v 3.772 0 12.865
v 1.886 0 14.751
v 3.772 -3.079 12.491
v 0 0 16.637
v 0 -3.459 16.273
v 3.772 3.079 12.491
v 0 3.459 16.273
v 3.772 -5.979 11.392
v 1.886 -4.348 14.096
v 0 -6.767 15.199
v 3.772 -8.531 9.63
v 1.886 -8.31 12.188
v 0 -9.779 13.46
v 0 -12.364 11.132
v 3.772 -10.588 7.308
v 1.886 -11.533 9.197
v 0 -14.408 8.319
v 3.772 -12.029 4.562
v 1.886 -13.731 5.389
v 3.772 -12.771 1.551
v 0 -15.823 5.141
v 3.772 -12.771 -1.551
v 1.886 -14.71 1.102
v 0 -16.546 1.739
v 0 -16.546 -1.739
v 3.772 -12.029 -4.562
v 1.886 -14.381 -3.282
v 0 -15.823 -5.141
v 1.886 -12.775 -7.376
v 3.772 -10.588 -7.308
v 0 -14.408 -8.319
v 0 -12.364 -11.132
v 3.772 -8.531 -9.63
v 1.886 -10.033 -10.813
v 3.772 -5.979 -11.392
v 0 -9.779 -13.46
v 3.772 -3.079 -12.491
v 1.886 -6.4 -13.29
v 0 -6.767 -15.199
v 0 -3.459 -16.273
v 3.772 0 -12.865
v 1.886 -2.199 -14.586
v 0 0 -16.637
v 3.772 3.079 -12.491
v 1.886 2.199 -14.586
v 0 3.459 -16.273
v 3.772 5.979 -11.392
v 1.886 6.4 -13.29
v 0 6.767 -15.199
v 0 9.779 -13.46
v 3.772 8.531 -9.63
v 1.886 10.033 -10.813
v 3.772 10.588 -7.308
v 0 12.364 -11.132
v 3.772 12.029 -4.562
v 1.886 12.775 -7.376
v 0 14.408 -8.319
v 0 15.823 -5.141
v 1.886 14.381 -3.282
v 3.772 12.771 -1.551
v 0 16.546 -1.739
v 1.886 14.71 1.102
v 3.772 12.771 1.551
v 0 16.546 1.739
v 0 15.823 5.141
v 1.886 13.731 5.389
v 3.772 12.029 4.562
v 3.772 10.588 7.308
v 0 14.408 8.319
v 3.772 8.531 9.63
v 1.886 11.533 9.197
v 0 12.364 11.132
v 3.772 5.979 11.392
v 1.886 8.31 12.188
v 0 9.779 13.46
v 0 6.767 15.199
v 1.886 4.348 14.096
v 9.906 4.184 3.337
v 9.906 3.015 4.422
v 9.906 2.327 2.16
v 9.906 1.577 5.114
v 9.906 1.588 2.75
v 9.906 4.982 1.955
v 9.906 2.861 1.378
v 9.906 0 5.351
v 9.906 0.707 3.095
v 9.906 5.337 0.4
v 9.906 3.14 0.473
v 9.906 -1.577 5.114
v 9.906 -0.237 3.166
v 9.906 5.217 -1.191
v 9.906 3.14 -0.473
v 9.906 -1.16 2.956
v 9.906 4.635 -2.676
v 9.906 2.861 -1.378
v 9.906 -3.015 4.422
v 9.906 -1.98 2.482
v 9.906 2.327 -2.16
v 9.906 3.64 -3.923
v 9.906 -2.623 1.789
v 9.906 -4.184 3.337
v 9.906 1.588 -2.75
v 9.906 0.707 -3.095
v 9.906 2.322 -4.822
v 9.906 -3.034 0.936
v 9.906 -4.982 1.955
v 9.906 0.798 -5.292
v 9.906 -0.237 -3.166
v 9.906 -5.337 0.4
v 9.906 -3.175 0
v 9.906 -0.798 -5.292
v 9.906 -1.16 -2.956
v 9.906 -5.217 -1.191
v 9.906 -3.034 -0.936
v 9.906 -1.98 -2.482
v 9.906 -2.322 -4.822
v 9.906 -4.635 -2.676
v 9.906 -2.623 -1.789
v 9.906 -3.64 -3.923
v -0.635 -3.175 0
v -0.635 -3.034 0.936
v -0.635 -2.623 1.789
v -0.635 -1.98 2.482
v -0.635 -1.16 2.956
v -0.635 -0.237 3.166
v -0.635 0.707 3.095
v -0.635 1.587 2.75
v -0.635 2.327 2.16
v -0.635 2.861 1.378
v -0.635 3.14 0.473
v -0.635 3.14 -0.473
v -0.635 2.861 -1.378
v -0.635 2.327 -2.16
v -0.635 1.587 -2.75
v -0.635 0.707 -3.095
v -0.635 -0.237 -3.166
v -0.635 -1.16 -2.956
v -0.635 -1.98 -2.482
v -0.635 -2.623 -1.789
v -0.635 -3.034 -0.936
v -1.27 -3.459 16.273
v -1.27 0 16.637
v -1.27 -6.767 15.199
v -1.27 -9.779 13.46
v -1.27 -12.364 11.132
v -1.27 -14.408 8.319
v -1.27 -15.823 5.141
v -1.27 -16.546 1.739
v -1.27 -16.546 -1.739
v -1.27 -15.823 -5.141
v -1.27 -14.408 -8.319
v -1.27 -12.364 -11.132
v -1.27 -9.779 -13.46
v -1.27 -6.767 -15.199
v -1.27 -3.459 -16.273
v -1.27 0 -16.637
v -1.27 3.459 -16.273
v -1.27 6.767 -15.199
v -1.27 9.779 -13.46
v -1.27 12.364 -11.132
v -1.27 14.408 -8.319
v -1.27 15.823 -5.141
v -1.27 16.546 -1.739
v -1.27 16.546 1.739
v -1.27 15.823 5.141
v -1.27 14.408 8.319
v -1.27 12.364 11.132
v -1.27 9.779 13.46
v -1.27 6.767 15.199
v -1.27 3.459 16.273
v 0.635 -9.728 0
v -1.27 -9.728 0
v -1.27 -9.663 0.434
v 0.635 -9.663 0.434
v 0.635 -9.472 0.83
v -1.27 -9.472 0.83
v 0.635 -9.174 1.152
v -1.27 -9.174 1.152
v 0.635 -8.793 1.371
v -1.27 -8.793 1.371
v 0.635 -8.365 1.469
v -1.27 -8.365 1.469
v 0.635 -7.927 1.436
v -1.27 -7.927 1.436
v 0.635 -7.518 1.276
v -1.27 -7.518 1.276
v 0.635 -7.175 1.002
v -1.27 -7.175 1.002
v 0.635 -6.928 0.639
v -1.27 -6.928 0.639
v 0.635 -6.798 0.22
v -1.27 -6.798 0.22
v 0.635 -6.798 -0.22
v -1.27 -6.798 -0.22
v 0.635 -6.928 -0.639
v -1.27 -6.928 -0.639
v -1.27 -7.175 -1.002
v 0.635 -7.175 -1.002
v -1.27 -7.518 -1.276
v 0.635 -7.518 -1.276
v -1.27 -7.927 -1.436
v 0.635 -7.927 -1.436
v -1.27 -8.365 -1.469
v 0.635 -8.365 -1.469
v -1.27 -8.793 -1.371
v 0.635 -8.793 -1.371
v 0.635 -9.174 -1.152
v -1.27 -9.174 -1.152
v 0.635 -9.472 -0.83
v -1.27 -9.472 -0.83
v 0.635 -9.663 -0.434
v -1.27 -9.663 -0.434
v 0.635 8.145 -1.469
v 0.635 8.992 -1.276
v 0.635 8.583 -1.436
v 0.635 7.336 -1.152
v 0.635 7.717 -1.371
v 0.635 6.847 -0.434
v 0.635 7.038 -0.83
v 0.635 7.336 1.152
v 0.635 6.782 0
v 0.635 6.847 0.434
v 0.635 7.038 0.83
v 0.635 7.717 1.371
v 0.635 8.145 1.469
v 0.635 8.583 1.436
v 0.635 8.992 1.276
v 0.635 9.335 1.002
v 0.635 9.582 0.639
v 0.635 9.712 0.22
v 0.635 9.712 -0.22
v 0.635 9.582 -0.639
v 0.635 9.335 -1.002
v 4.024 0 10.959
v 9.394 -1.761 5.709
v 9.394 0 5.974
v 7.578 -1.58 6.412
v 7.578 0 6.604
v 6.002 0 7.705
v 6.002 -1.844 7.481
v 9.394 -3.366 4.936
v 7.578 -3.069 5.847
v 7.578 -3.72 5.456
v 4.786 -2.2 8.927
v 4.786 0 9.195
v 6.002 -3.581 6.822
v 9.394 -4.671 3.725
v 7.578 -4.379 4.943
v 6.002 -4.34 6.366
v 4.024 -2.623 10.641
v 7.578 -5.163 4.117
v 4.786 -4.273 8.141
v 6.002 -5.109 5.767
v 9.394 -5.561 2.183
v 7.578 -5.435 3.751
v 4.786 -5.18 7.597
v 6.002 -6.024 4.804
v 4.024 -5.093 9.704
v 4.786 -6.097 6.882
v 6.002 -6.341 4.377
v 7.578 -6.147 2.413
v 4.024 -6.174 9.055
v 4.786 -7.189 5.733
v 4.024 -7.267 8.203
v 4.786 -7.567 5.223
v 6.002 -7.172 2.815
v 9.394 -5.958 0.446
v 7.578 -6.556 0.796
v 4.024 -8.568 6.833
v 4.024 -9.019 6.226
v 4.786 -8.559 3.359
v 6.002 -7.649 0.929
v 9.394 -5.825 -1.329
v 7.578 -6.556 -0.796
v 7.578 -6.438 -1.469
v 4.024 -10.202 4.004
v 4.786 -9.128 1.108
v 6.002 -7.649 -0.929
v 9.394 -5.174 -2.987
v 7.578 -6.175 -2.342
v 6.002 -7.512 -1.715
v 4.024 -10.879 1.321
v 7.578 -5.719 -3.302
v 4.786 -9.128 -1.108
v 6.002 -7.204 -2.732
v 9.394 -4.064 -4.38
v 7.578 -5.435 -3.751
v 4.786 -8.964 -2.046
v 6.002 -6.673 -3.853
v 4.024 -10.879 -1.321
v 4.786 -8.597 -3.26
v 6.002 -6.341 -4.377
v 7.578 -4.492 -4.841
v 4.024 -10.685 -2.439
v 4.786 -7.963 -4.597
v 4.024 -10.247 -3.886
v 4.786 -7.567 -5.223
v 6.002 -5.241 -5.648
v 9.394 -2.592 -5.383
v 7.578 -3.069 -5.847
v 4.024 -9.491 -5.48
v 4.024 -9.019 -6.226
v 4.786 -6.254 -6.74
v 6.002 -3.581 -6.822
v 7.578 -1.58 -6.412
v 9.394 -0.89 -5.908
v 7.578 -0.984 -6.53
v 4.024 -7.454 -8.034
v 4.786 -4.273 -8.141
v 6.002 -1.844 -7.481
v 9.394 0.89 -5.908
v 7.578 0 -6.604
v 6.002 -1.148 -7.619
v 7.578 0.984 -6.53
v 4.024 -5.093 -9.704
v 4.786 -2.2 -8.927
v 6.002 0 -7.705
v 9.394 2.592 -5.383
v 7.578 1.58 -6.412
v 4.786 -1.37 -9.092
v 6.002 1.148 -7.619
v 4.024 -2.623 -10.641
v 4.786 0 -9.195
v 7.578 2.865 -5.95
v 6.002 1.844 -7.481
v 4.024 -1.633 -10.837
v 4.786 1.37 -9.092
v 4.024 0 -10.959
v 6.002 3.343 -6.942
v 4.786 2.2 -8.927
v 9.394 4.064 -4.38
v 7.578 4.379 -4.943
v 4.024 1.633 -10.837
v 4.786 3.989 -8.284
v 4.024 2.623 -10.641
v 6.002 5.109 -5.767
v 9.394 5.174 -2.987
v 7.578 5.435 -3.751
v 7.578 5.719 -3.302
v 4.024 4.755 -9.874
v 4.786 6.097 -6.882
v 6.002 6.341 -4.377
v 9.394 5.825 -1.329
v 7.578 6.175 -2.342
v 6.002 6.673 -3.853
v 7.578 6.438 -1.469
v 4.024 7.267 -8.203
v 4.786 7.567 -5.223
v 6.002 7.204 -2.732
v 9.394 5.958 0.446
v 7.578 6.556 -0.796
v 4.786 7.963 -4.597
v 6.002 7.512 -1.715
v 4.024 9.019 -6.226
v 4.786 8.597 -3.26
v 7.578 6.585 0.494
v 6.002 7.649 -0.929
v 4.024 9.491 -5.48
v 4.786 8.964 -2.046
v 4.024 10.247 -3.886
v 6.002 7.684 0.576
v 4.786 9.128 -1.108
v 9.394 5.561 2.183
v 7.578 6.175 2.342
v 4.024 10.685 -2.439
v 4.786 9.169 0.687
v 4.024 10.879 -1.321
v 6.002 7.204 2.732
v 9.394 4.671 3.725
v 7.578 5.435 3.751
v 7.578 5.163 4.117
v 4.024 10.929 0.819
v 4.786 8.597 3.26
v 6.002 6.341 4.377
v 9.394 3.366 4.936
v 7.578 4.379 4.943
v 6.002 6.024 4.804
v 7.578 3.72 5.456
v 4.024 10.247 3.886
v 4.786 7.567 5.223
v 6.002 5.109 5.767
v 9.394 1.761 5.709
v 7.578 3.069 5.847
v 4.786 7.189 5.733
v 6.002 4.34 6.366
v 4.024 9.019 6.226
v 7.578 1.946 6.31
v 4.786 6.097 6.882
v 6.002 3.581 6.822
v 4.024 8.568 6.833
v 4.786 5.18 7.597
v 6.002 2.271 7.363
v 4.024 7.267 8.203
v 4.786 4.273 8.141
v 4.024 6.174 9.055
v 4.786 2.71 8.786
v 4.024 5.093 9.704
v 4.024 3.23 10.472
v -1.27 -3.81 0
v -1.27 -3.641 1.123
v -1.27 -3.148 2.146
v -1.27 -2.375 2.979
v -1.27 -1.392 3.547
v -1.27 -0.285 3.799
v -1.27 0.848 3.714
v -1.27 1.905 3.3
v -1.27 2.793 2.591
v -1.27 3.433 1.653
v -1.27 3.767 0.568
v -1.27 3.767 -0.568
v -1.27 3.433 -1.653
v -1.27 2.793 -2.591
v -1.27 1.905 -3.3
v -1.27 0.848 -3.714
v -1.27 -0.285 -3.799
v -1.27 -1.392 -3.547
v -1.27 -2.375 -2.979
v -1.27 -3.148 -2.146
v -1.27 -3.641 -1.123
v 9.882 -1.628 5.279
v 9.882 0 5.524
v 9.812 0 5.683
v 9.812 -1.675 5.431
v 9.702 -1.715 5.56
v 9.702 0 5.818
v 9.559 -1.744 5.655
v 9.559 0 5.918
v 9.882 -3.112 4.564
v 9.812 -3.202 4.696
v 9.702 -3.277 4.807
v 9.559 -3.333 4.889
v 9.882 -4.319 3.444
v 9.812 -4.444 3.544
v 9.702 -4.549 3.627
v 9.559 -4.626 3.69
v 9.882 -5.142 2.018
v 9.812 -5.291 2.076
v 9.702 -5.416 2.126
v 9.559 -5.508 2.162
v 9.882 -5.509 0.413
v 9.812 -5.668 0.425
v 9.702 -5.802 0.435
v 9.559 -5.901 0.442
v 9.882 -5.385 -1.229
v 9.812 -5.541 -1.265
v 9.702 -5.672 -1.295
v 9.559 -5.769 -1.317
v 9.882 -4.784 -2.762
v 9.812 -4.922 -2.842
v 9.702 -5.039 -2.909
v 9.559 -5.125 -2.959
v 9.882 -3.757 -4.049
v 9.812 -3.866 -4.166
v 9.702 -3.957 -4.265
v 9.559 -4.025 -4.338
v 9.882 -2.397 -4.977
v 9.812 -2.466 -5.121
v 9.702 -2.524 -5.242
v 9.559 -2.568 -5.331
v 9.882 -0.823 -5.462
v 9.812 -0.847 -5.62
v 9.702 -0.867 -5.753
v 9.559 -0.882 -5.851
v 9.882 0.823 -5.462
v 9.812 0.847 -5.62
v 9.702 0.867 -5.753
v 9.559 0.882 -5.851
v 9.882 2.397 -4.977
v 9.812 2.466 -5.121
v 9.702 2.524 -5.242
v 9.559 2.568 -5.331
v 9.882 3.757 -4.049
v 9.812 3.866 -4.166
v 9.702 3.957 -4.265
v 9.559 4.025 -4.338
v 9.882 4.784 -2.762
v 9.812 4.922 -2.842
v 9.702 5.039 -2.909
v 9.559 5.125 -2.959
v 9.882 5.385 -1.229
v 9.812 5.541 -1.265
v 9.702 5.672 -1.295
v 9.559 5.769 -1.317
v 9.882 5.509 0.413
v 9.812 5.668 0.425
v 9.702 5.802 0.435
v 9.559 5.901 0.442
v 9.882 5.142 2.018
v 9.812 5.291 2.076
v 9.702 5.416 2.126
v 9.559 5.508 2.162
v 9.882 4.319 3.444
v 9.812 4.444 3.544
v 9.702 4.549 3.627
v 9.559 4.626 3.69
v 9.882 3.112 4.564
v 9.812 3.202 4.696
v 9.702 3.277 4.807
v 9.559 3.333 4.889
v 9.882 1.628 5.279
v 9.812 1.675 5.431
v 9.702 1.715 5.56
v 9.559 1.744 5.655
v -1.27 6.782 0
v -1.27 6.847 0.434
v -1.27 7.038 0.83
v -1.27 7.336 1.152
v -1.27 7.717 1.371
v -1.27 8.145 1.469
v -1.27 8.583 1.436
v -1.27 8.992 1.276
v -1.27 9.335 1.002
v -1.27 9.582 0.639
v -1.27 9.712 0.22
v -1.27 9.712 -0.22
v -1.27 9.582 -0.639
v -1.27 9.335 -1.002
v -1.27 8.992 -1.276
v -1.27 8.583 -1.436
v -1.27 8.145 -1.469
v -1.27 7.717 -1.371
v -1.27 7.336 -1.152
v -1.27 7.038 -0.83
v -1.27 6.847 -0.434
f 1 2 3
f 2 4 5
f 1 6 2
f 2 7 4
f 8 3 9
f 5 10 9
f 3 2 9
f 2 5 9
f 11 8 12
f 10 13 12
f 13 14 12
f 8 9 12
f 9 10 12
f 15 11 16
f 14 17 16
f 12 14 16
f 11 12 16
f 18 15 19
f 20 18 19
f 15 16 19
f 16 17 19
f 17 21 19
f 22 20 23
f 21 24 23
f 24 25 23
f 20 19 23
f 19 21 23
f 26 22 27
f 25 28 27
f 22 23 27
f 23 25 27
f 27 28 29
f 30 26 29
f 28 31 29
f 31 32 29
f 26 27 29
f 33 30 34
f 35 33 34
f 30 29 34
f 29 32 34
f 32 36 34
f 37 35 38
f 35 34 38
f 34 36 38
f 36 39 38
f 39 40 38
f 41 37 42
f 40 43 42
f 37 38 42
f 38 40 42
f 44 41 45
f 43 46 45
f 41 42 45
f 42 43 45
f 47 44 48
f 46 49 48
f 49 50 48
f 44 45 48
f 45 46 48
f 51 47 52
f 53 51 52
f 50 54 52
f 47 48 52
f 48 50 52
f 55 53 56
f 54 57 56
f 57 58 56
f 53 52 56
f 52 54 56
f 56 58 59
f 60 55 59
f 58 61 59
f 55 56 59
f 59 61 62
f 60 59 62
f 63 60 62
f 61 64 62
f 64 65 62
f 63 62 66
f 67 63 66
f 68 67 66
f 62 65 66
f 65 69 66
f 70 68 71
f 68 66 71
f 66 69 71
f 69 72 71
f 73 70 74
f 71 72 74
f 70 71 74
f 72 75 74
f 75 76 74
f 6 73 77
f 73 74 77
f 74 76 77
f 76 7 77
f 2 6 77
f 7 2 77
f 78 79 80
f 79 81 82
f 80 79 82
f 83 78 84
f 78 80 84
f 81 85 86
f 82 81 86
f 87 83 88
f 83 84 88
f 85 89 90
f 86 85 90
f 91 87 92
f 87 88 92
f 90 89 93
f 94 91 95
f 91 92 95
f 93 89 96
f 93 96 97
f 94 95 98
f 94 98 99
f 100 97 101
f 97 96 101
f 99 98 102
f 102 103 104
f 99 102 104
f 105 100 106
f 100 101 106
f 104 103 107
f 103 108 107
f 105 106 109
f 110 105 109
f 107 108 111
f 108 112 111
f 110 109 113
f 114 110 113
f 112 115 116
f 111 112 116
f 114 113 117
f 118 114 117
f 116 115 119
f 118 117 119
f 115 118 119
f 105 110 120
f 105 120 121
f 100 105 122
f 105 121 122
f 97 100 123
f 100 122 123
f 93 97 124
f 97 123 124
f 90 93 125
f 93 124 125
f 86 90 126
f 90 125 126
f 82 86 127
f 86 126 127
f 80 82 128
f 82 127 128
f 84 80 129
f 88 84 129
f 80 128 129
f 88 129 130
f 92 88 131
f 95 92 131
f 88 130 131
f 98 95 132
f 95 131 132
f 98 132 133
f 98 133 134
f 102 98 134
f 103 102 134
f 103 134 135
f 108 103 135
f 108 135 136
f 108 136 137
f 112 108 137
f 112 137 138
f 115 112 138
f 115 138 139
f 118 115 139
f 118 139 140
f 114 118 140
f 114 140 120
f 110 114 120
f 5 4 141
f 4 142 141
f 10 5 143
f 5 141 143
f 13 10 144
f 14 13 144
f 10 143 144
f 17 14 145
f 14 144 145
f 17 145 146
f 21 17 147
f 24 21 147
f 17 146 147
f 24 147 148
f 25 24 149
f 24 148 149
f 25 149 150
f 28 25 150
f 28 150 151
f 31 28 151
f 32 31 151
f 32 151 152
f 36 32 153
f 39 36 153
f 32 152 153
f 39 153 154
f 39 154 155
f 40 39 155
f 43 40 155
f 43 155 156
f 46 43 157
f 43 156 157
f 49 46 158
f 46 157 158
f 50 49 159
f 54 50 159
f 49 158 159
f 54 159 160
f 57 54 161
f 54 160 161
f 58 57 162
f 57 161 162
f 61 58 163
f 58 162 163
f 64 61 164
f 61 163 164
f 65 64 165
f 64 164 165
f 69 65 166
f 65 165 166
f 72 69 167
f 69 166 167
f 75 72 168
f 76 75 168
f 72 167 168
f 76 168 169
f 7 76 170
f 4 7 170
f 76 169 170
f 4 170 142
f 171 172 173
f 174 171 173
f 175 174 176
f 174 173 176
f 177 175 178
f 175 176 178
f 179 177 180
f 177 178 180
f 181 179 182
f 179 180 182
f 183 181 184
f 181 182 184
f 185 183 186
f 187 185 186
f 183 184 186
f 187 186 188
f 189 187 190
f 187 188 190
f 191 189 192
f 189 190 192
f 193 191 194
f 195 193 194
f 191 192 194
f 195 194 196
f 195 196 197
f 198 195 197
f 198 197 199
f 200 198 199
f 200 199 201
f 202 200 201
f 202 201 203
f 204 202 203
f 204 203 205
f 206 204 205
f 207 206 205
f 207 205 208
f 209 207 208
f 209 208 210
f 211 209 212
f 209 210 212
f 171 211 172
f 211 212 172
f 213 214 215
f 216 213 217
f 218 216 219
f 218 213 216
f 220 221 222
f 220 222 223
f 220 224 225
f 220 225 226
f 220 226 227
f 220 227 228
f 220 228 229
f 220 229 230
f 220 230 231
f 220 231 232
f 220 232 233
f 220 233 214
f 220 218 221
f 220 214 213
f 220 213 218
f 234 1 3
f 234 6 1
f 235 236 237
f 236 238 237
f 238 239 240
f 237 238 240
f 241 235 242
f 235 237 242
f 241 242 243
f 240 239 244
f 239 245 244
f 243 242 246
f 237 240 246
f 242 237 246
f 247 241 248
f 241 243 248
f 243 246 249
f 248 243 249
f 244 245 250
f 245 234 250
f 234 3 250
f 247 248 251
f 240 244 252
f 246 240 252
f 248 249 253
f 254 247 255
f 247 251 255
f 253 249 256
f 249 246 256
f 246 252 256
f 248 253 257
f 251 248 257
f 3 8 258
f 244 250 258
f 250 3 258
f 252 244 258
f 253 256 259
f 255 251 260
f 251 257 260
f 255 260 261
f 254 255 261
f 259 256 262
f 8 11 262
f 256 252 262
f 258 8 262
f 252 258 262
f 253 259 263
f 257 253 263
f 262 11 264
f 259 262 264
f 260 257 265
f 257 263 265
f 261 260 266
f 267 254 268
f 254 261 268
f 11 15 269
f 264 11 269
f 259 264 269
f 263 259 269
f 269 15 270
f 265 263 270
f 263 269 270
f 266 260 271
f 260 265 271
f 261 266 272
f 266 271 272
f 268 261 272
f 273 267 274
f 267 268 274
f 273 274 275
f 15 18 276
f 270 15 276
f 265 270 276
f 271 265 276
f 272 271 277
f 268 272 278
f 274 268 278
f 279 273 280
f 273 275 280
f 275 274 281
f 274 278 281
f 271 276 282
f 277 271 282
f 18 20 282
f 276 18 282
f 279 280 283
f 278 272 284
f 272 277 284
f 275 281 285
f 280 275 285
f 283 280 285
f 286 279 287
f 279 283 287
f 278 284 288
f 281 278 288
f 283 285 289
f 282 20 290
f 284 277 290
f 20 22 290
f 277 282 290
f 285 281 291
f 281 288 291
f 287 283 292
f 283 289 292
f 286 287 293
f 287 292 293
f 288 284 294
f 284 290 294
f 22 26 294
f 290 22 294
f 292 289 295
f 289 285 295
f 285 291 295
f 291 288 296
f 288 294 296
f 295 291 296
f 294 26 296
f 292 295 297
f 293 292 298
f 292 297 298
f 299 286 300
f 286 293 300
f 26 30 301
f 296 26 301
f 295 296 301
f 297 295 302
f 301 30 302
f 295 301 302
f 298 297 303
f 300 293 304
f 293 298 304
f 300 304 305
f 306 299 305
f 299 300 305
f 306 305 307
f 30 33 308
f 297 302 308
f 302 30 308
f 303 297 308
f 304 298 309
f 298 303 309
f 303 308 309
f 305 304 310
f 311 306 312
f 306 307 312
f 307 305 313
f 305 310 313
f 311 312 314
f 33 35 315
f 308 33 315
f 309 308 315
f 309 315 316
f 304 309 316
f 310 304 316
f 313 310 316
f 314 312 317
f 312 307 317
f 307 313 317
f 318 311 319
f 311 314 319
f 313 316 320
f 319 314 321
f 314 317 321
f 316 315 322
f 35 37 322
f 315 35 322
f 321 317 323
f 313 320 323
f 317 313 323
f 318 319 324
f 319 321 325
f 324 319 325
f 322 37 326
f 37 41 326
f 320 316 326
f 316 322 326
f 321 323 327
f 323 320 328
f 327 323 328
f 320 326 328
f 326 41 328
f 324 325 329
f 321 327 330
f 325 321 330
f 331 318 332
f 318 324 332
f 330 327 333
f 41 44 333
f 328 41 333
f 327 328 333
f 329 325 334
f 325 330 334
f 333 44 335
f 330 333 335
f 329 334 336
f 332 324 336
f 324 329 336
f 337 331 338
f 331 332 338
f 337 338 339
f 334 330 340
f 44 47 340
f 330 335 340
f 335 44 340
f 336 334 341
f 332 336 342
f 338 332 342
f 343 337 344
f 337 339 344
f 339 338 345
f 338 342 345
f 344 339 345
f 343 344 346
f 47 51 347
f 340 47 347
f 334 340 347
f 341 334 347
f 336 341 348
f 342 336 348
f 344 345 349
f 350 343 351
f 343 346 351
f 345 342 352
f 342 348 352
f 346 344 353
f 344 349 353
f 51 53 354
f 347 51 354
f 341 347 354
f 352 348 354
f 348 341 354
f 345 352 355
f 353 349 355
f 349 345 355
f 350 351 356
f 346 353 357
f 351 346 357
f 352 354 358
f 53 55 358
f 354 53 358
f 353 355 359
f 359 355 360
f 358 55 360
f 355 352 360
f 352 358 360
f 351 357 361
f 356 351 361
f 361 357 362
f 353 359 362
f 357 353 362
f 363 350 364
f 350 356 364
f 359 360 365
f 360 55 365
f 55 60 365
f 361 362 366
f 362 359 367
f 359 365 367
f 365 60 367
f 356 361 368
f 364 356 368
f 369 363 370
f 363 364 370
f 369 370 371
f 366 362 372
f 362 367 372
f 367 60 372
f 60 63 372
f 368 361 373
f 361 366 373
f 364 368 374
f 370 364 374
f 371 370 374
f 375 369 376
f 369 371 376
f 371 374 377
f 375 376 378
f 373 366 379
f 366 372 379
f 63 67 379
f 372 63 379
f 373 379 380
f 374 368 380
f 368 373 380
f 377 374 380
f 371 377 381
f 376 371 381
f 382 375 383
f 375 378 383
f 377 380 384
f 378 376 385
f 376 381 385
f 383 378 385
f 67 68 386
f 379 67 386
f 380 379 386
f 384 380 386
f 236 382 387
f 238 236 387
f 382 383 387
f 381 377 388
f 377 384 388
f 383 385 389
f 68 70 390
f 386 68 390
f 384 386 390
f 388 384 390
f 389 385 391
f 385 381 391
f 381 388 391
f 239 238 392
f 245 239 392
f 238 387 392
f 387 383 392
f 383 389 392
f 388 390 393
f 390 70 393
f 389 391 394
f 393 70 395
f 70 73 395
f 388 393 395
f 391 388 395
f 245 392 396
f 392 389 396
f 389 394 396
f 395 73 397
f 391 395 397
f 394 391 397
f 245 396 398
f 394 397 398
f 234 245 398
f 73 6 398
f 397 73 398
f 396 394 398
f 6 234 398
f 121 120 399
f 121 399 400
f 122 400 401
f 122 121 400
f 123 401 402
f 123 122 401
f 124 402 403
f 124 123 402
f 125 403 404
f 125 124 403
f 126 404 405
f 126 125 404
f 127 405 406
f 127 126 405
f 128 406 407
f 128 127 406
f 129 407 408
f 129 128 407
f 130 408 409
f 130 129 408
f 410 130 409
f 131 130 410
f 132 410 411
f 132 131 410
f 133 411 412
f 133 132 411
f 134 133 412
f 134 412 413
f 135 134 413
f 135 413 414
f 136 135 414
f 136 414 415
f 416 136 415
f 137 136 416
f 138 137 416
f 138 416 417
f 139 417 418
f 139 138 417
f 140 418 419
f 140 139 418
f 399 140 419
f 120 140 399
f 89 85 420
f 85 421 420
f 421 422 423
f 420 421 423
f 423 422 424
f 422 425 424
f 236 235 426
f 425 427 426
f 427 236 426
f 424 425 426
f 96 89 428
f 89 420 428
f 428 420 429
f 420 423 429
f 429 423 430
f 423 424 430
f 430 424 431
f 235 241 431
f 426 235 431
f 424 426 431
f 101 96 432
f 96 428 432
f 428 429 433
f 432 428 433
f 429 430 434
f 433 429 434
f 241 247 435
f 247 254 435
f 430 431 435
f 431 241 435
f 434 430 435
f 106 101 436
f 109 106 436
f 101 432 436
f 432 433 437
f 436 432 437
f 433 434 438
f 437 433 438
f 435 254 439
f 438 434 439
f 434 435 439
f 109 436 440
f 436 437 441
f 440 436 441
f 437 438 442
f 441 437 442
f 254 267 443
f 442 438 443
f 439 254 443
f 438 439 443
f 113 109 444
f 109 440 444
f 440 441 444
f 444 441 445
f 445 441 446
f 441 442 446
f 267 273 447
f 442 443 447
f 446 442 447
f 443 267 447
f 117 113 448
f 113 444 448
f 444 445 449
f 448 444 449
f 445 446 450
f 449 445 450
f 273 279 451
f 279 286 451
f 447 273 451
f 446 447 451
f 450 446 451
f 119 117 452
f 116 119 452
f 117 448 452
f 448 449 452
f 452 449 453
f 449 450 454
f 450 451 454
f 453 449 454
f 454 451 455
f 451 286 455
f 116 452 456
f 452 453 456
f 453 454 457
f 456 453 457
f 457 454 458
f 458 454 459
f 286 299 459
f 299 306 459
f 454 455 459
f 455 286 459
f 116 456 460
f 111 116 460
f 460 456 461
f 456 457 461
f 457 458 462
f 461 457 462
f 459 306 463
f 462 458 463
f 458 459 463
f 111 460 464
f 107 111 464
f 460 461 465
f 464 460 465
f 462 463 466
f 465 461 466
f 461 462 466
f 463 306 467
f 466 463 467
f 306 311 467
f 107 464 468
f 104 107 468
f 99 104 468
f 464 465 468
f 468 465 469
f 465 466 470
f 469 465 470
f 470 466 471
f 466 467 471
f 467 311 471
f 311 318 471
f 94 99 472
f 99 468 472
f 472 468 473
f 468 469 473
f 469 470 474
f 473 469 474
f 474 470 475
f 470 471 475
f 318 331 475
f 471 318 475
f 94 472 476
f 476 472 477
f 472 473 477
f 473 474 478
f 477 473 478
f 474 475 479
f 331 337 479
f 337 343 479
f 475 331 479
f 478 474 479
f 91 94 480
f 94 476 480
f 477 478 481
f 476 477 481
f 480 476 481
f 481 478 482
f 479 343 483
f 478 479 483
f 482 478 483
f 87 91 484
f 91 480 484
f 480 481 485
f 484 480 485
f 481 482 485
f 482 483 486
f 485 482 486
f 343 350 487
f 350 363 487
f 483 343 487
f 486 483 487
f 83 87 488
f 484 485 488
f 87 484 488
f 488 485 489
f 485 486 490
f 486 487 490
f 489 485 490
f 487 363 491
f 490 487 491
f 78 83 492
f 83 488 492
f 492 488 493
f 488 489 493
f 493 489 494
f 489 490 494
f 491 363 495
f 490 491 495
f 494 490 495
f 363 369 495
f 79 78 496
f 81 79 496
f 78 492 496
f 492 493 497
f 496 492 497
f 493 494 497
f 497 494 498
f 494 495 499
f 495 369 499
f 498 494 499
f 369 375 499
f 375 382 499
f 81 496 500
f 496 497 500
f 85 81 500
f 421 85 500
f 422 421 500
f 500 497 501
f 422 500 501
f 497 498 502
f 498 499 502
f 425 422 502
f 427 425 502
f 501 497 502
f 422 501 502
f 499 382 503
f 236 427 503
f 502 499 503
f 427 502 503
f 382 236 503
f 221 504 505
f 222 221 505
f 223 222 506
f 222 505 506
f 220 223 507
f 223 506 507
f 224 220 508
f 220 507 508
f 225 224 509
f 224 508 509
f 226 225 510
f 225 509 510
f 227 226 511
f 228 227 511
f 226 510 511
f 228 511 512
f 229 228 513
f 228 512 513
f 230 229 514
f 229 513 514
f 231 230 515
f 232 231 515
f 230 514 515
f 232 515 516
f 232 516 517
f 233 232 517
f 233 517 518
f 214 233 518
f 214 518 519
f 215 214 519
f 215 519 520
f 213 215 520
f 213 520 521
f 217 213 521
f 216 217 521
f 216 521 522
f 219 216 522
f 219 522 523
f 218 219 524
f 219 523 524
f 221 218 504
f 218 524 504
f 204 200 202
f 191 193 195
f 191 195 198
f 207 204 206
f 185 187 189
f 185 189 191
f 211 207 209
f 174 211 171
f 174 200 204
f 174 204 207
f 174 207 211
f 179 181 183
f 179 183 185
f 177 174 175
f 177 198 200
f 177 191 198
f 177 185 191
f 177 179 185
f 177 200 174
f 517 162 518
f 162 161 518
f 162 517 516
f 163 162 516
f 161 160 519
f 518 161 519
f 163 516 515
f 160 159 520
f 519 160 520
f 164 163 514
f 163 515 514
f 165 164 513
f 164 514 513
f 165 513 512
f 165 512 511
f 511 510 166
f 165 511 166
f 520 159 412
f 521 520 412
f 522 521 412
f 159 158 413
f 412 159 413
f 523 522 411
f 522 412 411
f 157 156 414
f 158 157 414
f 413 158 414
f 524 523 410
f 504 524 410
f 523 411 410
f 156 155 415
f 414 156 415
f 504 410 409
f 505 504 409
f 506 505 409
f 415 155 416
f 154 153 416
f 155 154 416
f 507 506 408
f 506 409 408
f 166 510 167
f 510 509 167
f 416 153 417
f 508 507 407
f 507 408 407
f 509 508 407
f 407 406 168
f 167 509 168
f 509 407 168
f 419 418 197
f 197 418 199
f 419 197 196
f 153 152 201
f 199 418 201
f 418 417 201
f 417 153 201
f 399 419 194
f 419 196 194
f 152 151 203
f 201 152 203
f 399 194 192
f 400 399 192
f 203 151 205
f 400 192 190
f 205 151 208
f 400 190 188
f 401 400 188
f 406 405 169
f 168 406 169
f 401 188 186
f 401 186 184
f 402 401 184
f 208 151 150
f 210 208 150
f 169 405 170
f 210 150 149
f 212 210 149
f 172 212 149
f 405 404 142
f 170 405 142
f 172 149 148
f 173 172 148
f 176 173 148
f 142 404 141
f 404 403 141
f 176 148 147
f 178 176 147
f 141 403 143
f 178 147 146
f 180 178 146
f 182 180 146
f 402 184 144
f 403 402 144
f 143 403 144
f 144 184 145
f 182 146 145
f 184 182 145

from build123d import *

# Parameters (mm, degrees)
F3_R     = 3.175
F4_DEPTH = 25.4
F5_R     = 3.81
F7_R     = 1.4732
F8_DEPTH = 1.905


# Not quite as in the source:
# - an extrude whose draft closes it to a point is written as a loft to that point


with BuildPart() as f1:
    # F0 (on Front) → F1 (revolve)
    with BuildSketch(Plane.XZ):
        with BuildLine():
            Line((-1.27, 16.637), (-1.27, 0))
            Line((-1.27, 0), (9.906, 0))
            Line((9.906, 0), (9.906, 5.3514806986))
            ThreePointArc((9.906, 5.3514806986), (9.7616470495, 5.7545817689), (9.3942189832, 5.9744109372))
            ThreePointArc((9.3942189832, 5.9744109372), (5.3425686191, 8.407770264), (3.7717075708, 12.8652924292))
            Line((3.7717075708, 12.8652924292), (0, 16.637))
            Line((0, 16.637), (-1.27, 16.637))
        make_face()
    revolve(axis=Axis((4.318, 0, 0), (1, 0, 0)))

    # F3 (on face) → F4 (cut)
    with BuildSketch(Plane(origin=(-1.27, 0, 0), x_dir=(0, -1, 0), z_dir=(-1, 0, 0))):
        Circle(F3_R)
    extrude(amount=-F4_DEPTH, mode=Mode.SUBTRACT)

    # F5 (on face) → F6 section 0
    with BuildSketch(Plane(origin=(-1.27, 0, 0), x_dir=(0, -1, 0), z_dir=(-1, 0, 0)), mode=Mode.PRIVATE) as f6_s0:
        Circle(F5_R)
    loft([f6_s0.sketch, Vertex(2.54, 0, 0)], ruled=True, mode=Mode.SUBTRACT)

    # F7 (on face) → F8 (cut)
    with BuildSketch(Plane(origin=(-1.27, 0, 0), x_dir=(0, -1, 0), z_dir=(-1, 0, 0))):
        with Locations((-8.255, 0)):
            Circle(F7_R)
        with Locations((8.255, 0)):
            Circle(F7_R)
    extrude(amount=-F8_DEPTH, mode=Mode.SUBTRACT)


solid = f1.part
